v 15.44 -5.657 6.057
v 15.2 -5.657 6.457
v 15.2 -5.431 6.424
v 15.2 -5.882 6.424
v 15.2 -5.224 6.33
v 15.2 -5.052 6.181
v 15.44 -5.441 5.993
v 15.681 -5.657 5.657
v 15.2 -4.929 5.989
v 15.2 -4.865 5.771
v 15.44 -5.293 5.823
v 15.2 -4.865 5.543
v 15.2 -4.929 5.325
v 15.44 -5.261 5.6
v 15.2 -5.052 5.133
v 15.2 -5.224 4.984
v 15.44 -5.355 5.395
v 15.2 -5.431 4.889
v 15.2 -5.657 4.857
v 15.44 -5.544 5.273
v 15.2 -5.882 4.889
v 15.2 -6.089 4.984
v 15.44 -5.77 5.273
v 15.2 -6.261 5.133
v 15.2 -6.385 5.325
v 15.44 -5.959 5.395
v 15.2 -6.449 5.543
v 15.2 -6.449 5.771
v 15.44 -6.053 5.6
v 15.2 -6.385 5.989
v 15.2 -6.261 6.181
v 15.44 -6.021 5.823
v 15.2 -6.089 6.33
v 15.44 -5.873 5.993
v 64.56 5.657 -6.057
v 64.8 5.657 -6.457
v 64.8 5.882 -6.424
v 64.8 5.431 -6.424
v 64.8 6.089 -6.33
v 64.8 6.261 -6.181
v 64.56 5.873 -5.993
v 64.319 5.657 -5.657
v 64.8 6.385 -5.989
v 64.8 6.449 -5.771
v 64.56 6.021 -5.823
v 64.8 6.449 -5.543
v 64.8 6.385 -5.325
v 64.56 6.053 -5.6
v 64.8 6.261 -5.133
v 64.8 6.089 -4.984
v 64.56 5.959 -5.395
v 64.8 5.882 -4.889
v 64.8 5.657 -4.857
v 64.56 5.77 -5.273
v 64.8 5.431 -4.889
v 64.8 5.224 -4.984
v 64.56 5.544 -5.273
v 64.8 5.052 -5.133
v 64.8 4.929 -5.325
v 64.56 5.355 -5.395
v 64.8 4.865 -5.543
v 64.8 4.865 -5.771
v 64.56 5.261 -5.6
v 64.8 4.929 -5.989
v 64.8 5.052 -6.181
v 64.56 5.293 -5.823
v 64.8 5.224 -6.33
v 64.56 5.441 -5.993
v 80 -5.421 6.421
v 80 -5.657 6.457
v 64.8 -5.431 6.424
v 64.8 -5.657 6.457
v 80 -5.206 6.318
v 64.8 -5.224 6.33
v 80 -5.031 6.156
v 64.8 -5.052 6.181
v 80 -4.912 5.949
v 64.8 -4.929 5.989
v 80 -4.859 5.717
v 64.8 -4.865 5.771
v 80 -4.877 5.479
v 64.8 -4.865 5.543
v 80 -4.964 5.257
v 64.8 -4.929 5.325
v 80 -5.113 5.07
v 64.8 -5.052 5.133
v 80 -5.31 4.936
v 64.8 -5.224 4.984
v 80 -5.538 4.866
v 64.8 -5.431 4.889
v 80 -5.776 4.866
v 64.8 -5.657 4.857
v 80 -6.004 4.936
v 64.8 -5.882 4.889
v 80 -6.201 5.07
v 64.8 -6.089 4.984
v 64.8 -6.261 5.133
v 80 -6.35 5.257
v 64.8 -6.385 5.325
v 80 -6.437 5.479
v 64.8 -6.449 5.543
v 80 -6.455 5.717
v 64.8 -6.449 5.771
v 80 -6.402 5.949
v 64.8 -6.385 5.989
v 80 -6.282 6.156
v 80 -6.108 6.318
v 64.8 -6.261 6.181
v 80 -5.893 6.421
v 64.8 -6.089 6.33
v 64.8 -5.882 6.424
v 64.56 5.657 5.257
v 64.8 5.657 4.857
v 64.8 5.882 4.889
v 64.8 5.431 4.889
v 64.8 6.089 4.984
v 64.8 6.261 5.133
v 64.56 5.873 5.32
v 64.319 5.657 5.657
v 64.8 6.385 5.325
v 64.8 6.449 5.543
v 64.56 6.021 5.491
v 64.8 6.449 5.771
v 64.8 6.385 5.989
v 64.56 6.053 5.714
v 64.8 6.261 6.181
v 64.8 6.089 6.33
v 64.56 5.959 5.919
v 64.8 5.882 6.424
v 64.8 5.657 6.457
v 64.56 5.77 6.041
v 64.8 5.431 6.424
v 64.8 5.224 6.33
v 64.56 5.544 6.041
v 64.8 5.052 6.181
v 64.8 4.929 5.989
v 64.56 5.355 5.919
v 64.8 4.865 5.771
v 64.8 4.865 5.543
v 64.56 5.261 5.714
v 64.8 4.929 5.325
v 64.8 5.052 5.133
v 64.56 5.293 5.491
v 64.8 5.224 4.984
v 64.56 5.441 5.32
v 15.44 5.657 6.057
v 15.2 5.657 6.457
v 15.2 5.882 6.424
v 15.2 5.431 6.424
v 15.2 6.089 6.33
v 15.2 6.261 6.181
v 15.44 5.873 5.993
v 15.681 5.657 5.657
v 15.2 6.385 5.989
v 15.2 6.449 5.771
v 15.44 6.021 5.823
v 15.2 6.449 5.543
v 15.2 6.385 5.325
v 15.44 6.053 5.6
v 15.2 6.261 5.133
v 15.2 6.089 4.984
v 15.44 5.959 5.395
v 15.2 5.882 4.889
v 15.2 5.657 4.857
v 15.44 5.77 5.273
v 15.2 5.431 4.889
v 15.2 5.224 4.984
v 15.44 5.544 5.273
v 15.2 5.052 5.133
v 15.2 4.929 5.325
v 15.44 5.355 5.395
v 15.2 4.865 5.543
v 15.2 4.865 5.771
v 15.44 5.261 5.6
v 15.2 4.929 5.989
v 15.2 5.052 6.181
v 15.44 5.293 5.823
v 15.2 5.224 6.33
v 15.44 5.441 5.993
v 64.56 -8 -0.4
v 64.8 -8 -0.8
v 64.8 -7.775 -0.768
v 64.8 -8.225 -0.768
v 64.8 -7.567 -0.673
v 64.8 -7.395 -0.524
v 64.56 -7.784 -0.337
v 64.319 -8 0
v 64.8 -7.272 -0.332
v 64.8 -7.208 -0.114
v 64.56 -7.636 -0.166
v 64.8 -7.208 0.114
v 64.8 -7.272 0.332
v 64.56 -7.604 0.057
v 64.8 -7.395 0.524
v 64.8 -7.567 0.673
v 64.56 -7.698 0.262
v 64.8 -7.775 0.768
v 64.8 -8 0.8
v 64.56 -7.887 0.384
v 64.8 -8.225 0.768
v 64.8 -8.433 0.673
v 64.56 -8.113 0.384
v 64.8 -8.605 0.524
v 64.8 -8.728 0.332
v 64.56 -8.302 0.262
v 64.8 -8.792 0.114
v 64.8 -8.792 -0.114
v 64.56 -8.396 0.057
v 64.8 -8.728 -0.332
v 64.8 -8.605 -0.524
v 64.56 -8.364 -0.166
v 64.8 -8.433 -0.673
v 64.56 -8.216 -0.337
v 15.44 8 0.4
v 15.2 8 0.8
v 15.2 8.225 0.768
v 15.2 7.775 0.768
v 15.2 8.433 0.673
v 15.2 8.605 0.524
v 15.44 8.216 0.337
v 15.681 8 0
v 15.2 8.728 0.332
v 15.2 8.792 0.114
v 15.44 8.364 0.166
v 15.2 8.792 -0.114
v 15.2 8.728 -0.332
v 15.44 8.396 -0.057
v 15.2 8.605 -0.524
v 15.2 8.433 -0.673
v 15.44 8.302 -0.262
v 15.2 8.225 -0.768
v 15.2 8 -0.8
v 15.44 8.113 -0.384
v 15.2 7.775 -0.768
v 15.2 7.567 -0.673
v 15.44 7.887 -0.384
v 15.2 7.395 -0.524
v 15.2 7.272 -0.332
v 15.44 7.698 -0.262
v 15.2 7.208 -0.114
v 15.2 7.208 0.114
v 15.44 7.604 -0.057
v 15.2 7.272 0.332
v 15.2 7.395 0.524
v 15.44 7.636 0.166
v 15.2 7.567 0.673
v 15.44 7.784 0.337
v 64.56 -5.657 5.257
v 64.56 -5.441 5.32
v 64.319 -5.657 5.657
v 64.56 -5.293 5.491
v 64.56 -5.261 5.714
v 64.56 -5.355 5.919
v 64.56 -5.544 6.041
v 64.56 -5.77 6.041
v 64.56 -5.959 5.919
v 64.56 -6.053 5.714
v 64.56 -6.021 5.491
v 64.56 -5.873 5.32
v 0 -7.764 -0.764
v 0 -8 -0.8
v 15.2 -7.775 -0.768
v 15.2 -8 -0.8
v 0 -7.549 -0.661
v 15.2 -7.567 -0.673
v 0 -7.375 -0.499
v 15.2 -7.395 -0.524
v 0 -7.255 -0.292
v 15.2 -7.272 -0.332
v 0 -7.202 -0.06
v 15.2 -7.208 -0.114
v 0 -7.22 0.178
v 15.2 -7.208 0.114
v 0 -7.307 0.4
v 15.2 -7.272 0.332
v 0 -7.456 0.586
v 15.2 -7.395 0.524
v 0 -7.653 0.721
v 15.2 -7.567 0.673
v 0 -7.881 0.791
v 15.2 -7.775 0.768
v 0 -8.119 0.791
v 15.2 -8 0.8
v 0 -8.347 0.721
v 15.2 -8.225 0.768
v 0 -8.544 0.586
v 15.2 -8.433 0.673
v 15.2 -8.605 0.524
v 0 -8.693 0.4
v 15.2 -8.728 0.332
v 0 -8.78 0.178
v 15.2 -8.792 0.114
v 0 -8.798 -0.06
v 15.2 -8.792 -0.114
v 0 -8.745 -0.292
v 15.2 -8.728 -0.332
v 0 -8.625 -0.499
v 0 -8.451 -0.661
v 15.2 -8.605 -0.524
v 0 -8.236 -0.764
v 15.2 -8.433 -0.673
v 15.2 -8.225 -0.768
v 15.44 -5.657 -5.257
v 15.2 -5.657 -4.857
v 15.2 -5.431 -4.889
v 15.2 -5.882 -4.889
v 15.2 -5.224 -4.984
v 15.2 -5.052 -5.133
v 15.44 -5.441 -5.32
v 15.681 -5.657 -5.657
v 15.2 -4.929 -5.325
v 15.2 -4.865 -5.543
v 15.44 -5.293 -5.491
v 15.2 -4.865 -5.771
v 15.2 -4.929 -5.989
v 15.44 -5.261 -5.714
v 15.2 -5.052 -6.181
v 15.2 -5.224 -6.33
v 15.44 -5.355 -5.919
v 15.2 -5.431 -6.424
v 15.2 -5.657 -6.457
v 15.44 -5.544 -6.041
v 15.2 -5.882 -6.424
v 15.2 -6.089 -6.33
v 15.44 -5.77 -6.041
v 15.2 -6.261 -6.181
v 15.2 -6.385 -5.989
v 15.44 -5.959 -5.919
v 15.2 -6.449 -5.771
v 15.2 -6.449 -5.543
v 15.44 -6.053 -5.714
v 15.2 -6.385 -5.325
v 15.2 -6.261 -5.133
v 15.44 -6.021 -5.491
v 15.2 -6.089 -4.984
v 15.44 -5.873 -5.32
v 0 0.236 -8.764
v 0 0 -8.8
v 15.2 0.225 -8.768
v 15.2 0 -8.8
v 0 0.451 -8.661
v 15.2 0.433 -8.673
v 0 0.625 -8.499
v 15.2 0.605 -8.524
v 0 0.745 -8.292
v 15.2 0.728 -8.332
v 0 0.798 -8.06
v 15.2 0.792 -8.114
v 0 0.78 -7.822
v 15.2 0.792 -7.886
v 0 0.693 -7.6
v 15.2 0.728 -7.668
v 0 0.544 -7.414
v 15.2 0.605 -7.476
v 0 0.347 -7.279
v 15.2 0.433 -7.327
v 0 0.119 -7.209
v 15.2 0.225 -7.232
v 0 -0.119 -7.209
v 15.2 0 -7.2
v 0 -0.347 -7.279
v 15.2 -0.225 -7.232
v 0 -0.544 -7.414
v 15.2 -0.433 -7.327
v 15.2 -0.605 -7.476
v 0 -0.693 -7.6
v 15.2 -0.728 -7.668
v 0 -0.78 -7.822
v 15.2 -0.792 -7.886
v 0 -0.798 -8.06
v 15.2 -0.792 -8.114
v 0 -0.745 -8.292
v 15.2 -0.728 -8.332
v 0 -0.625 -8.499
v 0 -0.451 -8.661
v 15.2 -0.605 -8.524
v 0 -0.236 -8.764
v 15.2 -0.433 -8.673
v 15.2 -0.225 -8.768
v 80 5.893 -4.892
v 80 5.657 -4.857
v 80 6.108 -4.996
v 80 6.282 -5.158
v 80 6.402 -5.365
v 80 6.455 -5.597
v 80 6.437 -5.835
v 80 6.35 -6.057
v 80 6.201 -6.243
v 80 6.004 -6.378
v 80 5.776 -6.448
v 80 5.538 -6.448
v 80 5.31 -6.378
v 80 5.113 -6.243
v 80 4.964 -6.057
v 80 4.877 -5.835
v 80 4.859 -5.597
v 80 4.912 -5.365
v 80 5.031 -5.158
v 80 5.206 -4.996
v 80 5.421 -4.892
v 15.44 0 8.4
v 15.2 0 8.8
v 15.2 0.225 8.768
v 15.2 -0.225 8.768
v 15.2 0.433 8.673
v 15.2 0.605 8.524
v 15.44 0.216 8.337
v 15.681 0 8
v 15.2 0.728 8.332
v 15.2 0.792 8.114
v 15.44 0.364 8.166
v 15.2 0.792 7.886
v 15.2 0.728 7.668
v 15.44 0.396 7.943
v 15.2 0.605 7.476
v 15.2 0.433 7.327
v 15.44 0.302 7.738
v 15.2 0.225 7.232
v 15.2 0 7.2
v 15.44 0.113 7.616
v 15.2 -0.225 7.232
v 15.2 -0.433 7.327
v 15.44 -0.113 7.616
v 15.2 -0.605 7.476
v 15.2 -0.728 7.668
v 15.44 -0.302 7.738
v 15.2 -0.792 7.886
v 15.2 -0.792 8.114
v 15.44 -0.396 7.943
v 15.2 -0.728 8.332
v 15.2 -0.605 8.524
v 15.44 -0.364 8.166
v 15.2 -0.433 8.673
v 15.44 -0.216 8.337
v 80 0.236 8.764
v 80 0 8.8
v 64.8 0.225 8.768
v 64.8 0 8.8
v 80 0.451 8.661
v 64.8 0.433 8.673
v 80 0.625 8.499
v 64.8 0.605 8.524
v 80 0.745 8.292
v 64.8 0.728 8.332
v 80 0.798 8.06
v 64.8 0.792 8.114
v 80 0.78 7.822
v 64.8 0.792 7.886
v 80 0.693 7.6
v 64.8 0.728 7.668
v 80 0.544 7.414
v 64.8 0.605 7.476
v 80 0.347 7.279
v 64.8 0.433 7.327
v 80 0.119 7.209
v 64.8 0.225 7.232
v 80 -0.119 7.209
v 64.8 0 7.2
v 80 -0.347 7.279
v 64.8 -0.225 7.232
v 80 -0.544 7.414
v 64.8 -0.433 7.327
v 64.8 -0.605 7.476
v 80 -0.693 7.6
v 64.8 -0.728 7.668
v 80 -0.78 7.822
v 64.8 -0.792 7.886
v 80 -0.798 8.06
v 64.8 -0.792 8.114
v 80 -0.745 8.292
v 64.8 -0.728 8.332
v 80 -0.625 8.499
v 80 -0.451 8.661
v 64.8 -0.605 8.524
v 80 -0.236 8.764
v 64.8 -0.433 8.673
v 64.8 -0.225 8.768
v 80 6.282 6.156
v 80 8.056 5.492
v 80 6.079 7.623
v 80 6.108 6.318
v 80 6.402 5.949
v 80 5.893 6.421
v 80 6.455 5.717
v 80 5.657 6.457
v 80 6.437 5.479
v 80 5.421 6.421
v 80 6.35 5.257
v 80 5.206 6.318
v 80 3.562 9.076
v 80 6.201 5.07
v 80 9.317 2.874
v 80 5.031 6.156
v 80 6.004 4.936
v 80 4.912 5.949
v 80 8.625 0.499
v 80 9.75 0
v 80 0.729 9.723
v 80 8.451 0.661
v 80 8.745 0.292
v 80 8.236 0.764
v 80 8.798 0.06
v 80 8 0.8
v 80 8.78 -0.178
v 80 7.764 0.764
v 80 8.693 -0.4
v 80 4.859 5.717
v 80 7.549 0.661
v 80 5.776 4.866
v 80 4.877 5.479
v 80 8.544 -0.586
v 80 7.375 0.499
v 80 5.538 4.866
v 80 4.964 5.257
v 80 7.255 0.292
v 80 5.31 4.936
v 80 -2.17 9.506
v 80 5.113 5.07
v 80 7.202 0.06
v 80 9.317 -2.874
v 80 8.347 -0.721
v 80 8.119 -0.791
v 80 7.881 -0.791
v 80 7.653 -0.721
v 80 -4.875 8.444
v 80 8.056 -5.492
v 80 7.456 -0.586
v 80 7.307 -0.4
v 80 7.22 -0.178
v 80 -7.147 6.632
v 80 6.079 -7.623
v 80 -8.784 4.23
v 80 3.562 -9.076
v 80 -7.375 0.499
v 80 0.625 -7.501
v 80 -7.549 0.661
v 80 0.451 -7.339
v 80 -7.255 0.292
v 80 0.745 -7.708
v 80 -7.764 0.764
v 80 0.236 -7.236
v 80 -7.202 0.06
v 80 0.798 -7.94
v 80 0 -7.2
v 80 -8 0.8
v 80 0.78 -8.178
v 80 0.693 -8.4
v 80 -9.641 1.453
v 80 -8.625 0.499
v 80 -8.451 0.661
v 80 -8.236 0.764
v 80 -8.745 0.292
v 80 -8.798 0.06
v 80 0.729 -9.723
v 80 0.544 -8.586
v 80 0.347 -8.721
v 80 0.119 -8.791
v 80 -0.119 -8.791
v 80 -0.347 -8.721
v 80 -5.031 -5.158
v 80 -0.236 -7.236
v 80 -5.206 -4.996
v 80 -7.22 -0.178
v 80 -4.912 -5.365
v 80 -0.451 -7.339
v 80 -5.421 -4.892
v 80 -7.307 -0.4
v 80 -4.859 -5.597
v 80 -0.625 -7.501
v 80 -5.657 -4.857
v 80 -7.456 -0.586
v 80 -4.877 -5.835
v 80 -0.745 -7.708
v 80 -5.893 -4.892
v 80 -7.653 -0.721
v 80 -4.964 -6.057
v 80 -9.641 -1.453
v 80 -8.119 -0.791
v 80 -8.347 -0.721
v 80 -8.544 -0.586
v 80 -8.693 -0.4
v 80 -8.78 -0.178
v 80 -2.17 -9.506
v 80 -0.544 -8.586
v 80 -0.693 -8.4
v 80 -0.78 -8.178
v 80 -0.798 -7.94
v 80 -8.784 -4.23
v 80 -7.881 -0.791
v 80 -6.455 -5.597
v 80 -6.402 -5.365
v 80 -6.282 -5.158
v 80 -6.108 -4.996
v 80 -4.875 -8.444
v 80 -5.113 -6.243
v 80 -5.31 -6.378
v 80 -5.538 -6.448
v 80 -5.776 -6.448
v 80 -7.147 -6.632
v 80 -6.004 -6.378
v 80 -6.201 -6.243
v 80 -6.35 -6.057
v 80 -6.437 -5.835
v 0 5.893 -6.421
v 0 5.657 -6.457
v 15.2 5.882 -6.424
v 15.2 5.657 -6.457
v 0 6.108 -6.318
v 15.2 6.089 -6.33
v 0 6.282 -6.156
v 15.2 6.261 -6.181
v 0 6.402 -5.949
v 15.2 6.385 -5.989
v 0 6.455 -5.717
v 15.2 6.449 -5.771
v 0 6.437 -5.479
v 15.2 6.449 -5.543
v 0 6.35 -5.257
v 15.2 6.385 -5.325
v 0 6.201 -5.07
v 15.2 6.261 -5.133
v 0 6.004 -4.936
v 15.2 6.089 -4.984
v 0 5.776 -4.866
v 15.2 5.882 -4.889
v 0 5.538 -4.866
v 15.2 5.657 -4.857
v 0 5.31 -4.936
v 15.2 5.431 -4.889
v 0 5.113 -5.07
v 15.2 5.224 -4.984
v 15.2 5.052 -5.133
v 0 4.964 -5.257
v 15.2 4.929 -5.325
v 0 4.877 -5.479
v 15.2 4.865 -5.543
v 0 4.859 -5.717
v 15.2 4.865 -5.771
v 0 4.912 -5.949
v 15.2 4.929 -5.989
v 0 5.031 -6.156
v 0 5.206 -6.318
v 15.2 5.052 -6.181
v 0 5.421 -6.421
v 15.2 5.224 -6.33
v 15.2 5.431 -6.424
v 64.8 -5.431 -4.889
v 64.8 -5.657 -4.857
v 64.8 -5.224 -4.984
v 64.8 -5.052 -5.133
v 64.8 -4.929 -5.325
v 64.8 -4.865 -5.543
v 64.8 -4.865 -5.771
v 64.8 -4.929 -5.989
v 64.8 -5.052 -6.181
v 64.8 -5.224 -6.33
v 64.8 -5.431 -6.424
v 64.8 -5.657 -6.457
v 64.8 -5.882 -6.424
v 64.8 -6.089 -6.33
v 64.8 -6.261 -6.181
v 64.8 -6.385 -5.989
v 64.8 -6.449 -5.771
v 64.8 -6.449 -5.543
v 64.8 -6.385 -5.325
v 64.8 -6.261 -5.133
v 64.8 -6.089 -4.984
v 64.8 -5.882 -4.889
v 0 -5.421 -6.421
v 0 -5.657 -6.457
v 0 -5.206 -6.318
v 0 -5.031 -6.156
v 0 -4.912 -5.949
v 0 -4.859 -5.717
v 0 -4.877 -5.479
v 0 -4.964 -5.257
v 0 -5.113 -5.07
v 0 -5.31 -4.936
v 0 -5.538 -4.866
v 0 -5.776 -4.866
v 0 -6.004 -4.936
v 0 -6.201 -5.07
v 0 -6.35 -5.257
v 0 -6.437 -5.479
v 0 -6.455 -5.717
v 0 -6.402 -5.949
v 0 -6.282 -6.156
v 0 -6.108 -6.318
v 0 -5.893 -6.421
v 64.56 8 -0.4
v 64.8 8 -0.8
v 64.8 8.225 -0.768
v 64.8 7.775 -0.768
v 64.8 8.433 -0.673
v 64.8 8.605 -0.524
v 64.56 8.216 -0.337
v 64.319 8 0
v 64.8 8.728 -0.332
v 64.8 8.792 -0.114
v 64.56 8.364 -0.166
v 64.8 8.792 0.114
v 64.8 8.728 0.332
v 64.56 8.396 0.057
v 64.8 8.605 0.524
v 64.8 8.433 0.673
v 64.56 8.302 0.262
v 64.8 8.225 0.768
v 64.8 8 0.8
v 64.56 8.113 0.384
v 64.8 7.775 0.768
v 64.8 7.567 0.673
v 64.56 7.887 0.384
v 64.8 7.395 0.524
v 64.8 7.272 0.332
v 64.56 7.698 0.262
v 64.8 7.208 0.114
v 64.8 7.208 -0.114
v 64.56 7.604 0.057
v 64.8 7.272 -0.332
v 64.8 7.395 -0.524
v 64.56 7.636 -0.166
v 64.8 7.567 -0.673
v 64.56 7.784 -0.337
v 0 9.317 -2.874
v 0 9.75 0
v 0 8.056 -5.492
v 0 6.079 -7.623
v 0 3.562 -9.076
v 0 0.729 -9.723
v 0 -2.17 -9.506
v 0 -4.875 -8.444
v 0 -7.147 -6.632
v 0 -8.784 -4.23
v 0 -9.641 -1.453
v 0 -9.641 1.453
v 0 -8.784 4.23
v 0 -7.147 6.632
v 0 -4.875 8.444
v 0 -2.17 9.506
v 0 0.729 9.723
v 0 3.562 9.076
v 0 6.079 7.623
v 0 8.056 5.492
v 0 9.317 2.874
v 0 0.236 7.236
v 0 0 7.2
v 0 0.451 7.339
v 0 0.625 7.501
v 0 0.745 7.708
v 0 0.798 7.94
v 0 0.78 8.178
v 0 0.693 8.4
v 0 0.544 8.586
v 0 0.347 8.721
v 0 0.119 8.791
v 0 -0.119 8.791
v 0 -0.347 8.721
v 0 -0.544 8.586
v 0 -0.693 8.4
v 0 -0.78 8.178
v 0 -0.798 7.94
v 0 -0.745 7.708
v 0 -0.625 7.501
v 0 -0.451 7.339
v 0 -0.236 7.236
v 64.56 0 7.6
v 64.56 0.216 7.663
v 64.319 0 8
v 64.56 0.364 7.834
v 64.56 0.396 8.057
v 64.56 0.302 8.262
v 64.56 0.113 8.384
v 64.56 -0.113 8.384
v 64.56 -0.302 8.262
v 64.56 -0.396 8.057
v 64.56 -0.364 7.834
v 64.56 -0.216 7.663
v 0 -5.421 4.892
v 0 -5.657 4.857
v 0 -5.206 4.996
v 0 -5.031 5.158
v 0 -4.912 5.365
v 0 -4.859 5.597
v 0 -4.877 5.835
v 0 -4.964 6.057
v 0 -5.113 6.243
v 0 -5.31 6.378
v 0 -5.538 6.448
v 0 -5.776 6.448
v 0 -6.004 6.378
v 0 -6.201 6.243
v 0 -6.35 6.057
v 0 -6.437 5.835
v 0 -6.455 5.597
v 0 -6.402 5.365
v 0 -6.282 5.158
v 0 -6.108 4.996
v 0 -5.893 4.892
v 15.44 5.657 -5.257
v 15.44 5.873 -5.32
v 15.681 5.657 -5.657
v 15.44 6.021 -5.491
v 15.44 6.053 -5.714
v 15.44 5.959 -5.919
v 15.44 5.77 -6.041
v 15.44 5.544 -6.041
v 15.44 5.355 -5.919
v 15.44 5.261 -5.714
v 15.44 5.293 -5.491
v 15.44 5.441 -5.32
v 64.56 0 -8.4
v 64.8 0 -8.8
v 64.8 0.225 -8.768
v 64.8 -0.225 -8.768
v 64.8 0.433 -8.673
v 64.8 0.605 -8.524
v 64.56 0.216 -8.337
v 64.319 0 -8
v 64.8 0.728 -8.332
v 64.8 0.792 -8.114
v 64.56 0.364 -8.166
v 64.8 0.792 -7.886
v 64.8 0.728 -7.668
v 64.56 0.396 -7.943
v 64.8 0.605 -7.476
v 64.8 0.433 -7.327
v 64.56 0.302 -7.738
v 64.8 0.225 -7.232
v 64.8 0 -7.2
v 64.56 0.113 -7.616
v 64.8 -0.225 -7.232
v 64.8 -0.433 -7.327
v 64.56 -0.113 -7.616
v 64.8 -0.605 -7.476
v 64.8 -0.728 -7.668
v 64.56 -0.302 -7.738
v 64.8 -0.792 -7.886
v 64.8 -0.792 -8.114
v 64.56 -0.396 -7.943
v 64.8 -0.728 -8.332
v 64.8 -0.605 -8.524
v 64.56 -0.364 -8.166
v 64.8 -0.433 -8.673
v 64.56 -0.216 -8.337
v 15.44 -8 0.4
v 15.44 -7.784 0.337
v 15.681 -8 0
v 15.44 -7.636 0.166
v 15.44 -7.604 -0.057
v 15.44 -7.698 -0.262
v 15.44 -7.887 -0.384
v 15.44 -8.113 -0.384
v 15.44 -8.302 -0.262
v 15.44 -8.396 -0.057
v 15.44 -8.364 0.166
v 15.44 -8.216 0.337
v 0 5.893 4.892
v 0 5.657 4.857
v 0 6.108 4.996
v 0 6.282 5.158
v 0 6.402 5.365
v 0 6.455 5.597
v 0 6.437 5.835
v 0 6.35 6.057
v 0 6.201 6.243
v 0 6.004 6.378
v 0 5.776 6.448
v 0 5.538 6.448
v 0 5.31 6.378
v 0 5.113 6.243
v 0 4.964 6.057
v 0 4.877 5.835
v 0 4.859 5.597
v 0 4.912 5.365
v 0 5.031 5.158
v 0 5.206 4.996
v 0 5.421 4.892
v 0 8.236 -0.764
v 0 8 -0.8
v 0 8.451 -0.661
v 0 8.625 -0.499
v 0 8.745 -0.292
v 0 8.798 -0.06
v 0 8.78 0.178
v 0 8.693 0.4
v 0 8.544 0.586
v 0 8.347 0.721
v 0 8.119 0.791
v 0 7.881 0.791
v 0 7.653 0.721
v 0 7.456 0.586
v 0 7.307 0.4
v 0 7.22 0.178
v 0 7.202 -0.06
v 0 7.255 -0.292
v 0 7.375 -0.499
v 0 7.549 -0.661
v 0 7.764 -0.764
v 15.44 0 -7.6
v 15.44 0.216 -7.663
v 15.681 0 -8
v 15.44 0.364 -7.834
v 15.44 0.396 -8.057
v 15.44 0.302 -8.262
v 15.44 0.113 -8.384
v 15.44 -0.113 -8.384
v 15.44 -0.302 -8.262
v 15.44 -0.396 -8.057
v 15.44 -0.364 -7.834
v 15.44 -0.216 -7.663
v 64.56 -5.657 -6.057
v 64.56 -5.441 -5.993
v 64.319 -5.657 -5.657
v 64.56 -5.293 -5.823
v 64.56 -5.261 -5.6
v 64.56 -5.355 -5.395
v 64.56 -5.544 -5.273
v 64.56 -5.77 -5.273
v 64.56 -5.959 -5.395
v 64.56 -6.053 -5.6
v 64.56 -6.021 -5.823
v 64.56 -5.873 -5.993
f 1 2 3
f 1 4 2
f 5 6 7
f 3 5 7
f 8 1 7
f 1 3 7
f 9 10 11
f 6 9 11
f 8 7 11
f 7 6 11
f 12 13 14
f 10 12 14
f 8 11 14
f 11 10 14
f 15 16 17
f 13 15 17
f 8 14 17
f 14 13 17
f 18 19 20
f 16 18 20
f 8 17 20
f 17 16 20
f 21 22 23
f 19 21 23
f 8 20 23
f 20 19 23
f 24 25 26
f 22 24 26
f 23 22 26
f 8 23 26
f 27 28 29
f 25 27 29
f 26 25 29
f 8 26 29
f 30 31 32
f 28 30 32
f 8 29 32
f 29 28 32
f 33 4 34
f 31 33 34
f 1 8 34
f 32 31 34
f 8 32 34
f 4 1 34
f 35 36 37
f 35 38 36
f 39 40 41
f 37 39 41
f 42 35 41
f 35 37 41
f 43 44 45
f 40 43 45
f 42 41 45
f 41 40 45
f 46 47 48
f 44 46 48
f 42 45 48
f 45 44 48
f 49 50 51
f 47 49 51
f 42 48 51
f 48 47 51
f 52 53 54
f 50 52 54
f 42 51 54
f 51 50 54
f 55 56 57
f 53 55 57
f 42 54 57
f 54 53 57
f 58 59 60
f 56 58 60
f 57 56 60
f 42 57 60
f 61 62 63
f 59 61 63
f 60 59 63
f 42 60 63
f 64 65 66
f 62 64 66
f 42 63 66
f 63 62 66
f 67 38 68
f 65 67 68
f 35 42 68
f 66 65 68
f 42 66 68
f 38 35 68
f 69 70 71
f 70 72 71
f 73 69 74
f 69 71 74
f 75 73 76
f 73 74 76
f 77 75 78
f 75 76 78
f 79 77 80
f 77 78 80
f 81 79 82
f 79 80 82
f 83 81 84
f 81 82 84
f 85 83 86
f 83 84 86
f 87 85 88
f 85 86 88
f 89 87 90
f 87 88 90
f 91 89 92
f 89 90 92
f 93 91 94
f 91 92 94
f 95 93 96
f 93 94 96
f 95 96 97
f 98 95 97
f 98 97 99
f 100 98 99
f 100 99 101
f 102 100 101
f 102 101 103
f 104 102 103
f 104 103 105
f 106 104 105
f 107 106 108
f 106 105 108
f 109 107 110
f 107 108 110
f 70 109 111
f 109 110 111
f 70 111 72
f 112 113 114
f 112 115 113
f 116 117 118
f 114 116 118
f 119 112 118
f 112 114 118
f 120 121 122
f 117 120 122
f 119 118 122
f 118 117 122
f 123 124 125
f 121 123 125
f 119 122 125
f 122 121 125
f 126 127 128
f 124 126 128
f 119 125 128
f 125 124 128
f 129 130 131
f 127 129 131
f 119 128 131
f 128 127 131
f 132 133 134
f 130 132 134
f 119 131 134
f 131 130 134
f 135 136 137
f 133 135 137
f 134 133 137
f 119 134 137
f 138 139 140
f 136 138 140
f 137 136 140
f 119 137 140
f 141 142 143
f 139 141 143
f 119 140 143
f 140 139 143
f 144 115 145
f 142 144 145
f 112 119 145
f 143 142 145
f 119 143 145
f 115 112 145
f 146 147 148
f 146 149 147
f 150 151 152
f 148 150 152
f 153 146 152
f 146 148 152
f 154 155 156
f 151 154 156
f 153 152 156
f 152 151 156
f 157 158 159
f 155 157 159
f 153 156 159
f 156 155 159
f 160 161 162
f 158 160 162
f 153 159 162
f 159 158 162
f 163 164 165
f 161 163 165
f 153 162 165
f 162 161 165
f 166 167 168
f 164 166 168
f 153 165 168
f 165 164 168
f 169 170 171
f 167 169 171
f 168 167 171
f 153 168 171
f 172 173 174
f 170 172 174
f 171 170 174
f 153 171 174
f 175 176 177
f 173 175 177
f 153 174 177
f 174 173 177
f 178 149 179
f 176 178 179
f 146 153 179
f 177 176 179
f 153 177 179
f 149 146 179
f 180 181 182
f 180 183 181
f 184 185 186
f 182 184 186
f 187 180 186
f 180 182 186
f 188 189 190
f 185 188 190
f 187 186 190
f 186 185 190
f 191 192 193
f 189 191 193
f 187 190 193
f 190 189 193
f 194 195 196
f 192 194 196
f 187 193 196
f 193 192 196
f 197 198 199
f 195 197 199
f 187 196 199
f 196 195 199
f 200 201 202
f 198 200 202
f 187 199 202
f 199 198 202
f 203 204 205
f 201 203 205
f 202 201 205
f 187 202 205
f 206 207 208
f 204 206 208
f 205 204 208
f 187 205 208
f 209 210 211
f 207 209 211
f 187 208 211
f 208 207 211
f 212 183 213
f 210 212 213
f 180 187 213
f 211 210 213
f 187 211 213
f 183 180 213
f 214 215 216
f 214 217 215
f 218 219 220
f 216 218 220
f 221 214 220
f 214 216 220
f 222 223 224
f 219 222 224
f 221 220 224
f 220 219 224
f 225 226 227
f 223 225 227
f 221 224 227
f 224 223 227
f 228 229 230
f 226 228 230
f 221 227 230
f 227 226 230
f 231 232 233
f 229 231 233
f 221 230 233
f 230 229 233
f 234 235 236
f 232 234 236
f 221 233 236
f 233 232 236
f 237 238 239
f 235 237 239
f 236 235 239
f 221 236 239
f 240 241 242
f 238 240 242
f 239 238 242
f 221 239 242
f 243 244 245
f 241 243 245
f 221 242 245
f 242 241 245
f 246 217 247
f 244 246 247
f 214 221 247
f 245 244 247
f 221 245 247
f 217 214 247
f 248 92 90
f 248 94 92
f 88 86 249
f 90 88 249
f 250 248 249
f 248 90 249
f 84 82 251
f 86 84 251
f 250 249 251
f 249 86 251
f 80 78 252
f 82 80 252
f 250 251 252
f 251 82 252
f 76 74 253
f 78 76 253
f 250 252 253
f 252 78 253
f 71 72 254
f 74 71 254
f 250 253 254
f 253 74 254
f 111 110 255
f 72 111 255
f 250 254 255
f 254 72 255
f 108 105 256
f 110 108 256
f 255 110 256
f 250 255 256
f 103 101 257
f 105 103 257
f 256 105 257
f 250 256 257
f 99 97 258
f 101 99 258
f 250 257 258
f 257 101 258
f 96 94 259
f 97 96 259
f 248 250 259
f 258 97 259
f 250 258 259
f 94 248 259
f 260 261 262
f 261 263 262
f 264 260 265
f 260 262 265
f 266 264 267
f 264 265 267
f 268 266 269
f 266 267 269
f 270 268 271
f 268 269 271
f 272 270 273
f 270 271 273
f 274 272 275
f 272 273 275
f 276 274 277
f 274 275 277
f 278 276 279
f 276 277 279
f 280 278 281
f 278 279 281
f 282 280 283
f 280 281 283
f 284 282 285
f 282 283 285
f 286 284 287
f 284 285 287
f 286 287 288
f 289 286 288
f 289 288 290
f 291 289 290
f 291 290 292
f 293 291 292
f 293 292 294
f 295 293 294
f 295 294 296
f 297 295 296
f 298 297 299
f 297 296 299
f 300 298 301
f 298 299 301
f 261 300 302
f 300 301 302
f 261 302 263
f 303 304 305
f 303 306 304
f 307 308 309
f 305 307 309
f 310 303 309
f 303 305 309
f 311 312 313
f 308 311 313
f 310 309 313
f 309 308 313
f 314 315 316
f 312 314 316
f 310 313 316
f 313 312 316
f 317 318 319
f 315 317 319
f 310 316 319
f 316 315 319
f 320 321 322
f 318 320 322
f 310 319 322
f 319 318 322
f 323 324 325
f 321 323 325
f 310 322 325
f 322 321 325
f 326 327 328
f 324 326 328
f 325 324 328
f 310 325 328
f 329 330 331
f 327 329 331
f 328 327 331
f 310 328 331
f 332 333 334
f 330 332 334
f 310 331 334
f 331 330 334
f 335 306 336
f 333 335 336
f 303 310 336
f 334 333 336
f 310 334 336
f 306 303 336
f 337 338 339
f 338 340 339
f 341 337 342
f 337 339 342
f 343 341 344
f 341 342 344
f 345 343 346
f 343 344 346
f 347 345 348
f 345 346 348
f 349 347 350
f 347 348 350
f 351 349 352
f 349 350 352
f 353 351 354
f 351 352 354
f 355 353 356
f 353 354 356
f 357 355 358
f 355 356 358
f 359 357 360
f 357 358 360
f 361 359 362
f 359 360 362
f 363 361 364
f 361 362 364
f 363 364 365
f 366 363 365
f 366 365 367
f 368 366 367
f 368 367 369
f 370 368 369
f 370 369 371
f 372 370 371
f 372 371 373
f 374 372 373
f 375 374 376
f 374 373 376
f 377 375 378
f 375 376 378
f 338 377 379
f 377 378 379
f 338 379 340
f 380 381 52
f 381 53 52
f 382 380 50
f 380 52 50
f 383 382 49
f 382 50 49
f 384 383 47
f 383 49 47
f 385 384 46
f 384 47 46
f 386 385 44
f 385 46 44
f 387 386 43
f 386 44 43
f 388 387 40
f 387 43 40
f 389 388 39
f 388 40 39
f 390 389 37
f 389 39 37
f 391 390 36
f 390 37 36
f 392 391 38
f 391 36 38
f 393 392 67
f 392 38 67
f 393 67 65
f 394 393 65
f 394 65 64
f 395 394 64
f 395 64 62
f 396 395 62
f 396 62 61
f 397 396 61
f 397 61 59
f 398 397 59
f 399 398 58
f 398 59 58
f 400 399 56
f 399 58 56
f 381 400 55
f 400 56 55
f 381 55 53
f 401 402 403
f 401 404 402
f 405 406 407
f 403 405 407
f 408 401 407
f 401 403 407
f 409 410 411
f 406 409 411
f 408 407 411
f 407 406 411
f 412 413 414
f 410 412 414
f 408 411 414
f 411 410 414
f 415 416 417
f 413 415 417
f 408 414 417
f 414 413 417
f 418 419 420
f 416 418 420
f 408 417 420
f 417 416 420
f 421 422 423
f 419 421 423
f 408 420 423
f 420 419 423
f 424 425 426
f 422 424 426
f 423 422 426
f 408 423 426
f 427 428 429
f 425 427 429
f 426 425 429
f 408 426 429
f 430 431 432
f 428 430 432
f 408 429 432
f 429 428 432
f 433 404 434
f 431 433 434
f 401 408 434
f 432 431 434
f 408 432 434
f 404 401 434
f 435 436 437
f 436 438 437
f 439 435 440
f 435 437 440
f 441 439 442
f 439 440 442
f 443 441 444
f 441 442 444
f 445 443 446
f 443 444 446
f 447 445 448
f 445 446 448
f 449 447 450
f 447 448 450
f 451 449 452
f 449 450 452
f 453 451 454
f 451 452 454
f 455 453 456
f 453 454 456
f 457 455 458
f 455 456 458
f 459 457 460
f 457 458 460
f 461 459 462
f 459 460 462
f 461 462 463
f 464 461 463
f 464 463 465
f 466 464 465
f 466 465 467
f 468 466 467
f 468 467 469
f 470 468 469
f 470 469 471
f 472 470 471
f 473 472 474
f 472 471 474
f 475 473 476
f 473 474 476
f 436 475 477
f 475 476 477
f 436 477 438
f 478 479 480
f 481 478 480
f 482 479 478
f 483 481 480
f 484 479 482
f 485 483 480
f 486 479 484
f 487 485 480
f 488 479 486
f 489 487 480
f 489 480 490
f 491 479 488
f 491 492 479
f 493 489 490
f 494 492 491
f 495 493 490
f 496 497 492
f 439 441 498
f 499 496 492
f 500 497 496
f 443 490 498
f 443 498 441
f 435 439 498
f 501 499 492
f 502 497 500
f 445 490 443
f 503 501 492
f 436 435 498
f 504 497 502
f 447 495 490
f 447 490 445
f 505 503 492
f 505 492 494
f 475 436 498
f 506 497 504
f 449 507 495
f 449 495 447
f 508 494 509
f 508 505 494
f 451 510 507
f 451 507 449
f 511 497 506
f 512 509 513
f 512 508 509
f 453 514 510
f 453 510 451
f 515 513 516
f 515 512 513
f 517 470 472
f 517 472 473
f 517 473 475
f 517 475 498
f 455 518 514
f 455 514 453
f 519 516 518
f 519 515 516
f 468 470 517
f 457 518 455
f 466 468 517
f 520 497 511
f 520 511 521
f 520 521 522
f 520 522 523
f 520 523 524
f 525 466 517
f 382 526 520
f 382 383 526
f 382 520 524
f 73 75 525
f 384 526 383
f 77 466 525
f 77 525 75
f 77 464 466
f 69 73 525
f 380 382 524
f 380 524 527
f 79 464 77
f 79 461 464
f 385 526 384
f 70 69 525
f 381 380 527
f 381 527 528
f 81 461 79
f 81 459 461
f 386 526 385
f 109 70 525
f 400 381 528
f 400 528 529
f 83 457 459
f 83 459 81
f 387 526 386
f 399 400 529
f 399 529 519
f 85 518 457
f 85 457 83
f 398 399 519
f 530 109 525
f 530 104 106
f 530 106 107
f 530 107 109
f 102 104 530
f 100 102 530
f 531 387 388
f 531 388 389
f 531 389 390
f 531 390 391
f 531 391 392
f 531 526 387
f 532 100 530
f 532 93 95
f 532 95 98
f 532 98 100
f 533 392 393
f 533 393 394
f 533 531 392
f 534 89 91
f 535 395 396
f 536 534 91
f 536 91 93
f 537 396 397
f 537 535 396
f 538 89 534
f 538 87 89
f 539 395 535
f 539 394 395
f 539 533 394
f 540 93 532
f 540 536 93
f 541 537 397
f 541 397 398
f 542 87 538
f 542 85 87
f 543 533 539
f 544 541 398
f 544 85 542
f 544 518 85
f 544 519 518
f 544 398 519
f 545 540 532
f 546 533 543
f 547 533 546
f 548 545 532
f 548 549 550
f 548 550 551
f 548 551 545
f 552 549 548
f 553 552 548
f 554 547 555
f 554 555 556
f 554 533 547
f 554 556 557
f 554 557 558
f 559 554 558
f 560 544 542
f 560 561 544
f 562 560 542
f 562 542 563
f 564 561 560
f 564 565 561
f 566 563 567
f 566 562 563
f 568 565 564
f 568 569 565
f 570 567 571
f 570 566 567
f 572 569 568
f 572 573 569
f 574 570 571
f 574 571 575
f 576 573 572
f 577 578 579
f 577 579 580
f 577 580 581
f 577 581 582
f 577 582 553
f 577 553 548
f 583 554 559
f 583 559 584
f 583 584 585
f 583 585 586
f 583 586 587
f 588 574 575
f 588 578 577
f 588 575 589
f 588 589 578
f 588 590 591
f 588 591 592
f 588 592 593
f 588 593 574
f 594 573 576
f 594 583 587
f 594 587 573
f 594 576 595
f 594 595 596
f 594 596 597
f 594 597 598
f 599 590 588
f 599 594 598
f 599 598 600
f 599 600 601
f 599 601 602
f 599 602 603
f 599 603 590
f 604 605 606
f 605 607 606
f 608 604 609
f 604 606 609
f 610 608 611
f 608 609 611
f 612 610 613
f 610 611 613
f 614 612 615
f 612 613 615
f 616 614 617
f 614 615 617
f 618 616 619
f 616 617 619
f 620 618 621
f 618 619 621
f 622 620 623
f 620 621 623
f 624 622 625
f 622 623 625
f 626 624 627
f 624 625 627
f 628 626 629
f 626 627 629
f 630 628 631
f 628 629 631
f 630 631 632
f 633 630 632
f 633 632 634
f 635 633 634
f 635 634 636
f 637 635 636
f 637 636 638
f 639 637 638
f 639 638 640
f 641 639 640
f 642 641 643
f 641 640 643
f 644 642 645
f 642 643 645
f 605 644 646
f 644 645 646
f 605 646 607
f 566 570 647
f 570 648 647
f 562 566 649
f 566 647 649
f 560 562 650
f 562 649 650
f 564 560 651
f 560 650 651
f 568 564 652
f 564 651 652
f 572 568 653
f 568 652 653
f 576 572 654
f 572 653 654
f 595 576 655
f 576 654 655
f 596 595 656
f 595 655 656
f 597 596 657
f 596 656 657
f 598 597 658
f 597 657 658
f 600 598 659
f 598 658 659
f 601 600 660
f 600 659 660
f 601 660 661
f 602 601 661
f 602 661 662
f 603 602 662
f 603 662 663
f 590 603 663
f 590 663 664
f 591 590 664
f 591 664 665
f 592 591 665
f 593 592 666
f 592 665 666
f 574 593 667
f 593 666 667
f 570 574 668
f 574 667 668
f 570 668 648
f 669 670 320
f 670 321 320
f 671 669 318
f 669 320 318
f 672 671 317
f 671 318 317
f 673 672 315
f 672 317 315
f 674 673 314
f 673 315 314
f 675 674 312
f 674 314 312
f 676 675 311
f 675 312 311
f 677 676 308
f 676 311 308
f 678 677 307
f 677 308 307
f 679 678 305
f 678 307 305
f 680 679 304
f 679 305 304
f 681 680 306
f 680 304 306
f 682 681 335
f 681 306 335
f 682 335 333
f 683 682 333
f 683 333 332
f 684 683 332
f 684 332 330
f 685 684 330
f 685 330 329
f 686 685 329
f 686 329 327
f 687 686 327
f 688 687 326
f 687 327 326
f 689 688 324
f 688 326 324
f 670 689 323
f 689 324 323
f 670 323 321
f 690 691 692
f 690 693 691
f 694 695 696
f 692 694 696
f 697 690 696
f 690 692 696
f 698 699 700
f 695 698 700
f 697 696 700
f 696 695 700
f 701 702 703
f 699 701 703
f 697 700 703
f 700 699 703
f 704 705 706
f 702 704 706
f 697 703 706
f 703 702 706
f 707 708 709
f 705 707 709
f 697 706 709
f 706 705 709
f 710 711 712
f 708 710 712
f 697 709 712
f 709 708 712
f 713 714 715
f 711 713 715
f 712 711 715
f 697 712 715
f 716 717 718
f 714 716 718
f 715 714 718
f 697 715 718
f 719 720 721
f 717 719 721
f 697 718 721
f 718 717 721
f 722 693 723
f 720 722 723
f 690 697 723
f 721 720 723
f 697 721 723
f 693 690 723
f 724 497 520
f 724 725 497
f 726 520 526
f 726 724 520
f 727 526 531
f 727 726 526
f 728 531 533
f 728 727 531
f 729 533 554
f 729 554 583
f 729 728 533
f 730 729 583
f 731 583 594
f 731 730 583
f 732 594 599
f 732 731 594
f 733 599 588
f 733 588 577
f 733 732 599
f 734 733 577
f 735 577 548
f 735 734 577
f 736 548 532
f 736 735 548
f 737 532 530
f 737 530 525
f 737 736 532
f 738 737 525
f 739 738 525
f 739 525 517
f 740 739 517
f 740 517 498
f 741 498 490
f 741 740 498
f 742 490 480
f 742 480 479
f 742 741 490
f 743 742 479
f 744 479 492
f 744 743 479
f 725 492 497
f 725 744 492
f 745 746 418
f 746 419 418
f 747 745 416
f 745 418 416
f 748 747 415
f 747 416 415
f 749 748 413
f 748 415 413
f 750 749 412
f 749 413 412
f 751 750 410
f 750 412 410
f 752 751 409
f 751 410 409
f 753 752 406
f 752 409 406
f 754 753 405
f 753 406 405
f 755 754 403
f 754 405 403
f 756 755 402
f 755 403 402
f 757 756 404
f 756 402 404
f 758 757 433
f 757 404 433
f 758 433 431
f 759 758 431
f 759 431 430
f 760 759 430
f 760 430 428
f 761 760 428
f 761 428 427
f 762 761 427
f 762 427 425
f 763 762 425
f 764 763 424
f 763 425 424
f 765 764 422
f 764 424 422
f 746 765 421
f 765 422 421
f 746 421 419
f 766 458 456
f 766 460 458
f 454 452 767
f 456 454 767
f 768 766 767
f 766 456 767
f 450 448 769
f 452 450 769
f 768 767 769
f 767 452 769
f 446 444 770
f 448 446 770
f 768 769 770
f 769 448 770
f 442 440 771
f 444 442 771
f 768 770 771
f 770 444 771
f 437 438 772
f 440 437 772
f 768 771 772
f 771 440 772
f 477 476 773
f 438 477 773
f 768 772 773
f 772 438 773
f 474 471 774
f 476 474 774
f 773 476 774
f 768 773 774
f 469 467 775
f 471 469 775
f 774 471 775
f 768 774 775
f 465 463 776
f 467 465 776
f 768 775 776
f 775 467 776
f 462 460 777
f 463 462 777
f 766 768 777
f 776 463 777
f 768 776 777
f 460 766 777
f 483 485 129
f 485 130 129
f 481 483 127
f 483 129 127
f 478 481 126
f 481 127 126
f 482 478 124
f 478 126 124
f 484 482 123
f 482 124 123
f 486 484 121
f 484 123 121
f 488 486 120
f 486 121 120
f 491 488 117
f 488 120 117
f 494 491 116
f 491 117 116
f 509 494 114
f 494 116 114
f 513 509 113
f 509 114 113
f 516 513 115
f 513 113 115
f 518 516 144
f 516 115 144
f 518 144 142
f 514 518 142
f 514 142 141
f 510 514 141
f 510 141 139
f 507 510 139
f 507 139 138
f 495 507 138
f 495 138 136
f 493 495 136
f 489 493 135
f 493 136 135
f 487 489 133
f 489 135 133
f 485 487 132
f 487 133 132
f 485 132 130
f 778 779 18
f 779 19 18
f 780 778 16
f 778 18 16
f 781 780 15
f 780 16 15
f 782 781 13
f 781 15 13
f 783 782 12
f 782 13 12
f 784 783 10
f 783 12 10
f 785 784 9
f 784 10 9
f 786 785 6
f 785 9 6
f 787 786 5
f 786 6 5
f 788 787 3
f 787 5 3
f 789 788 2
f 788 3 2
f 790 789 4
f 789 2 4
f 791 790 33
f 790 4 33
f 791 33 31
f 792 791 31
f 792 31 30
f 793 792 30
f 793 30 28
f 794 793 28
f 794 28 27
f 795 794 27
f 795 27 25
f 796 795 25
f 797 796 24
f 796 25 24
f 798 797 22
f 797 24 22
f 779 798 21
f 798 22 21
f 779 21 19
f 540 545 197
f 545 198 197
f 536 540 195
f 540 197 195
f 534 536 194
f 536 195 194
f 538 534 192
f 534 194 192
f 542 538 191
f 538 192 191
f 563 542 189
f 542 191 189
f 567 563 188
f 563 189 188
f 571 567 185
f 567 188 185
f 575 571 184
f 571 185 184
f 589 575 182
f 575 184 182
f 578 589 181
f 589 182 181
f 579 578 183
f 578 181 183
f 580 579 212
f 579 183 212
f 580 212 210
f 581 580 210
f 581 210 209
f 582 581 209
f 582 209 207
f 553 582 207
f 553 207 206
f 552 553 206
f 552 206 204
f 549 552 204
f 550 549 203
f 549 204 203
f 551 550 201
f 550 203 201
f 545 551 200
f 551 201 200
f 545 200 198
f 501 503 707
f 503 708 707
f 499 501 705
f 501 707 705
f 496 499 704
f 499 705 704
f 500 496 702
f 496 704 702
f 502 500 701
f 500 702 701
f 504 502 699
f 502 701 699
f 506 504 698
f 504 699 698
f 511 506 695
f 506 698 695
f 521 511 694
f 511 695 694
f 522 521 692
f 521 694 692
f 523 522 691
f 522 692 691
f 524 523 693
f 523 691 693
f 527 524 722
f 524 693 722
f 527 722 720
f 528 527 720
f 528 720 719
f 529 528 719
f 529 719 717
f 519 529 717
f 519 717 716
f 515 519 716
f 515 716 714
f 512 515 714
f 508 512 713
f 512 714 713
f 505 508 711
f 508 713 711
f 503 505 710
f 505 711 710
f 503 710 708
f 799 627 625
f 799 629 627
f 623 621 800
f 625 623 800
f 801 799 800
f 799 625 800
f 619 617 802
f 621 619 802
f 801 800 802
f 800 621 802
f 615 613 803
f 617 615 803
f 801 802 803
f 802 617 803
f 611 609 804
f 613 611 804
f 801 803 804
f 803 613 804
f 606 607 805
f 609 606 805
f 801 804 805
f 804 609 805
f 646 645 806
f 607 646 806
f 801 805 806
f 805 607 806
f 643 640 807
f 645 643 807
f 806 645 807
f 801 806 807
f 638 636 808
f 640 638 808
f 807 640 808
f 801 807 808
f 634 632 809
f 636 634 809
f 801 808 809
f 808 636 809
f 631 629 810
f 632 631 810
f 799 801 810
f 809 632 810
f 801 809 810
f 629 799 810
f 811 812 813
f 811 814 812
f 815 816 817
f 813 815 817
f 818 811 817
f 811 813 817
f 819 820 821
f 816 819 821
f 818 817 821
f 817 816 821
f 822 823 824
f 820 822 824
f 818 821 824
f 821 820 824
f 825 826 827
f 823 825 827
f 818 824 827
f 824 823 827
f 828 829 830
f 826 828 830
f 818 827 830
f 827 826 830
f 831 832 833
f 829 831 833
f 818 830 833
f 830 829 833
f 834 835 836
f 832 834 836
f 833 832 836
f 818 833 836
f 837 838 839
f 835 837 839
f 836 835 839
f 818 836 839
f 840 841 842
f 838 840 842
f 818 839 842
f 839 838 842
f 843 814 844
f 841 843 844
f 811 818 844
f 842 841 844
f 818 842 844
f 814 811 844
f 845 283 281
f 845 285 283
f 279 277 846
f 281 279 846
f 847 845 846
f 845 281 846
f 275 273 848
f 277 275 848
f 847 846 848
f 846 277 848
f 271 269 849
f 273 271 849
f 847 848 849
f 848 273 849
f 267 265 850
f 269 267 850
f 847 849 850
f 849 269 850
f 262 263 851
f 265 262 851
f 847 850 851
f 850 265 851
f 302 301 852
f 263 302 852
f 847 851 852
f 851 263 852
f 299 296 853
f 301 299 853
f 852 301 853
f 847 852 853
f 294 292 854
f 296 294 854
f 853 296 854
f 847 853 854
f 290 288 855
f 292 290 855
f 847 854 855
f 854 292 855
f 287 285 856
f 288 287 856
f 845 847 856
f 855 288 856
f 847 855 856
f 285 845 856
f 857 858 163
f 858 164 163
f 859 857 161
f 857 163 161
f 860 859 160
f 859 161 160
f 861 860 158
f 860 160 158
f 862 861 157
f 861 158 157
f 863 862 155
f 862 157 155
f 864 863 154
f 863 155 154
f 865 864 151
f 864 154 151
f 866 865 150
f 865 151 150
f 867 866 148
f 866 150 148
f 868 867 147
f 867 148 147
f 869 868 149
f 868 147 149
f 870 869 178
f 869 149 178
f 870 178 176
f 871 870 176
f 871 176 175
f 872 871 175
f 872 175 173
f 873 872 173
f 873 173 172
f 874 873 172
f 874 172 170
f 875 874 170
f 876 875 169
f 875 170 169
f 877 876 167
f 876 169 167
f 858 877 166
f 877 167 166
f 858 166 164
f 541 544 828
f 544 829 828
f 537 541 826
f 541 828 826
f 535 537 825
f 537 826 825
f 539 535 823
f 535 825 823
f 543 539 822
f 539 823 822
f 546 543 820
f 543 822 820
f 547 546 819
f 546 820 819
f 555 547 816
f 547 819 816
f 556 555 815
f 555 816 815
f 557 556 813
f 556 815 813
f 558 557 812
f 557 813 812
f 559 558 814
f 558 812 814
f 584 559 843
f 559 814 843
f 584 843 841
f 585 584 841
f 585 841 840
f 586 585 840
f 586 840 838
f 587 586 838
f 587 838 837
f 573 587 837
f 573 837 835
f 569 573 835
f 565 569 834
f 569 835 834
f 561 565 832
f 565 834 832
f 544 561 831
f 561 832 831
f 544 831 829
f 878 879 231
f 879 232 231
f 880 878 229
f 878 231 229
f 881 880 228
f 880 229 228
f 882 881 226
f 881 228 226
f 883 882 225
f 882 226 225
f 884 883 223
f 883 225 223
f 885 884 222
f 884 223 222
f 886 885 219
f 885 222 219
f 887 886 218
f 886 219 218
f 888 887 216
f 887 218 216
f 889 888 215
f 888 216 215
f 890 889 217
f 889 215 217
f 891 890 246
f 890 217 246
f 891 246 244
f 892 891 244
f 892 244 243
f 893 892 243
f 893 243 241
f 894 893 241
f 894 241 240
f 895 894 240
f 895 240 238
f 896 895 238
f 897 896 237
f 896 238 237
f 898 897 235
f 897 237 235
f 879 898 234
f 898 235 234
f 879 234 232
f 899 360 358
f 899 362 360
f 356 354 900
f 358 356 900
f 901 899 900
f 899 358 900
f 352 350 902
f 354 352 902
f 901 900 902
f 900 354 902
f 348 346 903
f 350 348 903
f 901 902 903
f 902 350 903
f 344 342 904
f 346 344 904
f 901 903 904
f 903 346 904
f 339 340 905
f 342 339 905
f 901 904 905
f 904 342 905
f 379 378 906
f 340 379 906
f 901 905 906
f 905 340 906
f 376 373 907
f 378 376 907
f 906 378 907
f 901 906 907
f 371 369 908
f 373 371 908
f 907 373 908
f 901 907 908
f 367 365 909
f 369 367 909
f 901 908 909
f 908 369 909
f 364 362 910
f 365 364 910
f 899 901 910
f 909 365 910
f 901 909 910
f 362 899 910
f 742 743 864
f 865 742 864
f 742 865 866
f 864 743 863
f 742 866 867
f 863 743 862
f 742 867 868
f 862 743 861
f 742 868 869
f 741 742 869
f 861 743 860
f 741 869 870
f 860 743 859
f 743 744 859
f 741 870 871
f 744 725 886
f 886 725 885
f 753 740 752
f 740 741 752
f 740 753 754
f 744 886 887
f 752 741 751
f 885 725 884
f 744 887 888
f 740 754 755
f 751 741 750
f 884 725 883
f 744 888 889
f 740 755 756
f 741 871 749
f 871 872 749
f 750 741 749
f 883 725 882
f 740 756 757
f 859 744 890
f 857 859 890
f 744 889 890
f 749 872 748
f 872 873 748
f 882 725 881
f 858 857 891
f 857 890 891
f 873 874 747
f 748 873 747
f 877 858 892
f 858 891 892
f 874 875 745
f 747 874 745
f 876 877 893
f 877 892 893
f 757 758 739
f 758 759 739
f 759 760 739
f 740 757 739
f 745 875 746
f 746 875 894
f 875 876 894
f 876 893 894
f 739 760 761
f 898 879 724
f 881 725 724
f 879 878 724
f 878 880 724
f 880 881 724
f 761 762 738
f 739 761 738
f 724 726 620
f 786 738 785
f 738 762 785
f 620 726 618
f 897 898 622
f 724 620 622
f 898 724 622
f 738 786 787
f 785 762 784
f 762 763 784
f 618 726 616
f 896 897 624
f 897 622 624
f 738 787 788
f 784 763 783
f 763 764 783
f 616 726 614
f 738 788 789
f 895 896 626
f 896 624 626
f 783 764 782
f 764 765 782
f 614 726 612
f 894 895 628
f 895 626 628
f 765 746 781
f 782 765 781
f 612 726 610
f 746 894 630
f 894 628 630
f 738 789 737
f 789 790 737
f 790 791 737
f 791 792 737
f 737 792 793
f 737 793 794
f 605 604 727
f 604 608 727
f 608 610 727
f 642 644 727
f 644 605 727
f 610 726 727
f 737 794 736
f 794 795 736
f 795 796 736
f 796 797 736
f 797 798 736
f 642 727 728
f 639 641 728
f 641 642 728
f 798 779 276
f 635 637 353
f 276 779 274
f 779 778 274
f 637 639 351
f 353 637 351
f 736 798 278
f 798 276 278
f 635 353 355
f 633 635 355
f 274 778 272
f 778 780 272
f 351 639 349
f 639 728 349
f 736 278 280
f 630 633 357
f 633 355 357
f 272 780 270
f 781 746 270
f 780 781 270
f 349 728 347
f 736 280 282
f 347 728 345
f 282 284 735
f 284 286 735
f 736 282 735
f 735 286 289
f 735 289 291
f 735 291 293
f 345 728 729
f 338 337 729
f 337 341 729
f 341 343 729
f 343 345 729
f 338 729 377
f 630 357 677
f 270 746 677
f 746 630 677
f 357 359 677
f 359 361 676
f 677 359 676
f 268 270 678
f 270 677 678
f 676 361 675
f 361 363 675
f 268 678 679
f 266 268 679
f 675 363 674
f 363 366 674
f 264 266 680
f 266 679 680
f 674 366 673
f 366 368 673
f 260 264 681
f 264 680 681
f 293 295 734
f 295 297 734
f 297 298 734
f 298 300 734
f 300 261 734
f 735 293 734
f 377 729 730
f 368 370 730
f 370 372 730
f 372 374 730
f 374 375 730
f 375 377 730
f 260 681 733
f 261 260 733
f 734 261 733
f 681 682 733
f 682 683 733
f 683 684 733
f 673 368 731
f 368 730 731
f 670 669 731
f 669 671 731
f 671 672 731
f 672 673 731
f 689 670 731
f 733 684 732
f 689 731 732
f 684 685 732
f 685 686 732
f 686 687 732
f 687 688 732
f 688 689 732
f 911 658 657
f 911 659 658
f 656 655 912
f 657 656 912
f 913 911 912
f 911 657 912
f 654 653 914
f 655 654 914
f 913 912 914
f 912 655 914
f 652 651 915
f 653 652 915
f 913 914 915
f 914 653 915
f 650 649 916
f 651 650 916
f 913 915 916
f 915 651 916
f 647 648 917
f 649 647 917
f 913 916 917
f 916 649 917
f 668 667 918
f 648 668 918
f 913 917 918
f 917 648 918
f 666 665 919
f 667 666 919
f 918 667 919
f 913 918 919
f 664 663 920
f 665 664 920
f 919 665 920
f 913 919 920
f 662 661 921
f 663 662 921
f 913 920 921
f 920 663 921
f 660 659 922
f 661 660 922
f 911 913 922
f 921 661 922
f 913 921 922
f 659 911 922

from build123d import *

# Parameters (mm, degrees)
SKETCH_1_W                  = 80
SKETCH_1_H                  = 9.75
HOLE_WIZARD_1_6_1_6_1_D     = 1.6
HOLE_WIZARD_1_6_1_6_1_DEPTH = 15.2
HOLE_WIZARD_1_6_1_6_1_TIP   = 0.480688495
HOLE_WIZARD_1_6_1_6_2_D     = 1.6
HOLE_WIZARD_1_6_1_6_2_DEPTH = 15.2
HOLE_WIZARD_1_6_1_6_2_TIP   = 0.480688495


with BuildPart() as part:
    # 스케치1 → 회전1 (revolve)
    with BuildSketch(Plane(origin=(0, 0, 0), x_dir=(-1, 0, 0), z_dir=(0, 0, -1))):
        with Locations((-40, 4.875)):
            Rectangle(SKETCH_1_W, SKETCH_1_H)
    revolve(axis=Axis((80, 0, 0), (-1, 0, 0)))

    # Ø1.6 (1.6) 지름 구멍1
    with Locations(Plane.ZY):
        with Locations((0, 8), (-5.656854249, 5.656854249), (-8, 0), (-5.656854249, -5.656854249), (0, -8), (5.656854249, -5.656854249), (8, 0), (5.656854249, 5.656854249)):
            Hole(HOLE_WIZARD_1_6_1_6_1_D / 2, depth=HOLE_WIZARD_1_6_1_6_1_DEPTH)
            with Locations((0, 0, -(HOLE_WIZARD_1_6_1_6_1_DEPTH + HOLE_WIZARD_1_6_1_6_1_TIP / 2))):  # 118° drill point
                Cone(0, HOLE_WIZARD_1_6_1_6_1_D / 2, HOLE_WIZARD_1_6_1_6_1_TIP, mode=Mode.SUBTRACT)

    # Ø1.6 (1.6) 지름 구멍2
    with Locations(Plane(origin=(80, 0, 0), x_dir=(0, 0, -1), z_dir=(1, 0, 0))):
        with Locations((0, 8), (5.656854249, 5.656854249), (8, 0), (5.656854249, -5.656854249), (0, -8), (-5.656854249, -5.656854249), (-8, 0), (-5.656854249, 5.656854249)):
            Hole(HOLE_WIZARD_1_6_1_6_2_D / 2, depth=HOLE_WIZARD_1_6_1_6_2_DEPTH)
            with Locations((0, 0, -(HOLE_WIZARD_1_6_1_6_2_DEPTH + HOLE_WIZARD_1_6_1_6_2_TIP / 2))):  # 118° drill point
                Cone(0, HOLE_WIZARD_1_6_1_6_2_D / 2, HOLE_WIZARD_1_6_1_6_2_TIP, mode=Mode.SUBTRACT)


solid = part.part
